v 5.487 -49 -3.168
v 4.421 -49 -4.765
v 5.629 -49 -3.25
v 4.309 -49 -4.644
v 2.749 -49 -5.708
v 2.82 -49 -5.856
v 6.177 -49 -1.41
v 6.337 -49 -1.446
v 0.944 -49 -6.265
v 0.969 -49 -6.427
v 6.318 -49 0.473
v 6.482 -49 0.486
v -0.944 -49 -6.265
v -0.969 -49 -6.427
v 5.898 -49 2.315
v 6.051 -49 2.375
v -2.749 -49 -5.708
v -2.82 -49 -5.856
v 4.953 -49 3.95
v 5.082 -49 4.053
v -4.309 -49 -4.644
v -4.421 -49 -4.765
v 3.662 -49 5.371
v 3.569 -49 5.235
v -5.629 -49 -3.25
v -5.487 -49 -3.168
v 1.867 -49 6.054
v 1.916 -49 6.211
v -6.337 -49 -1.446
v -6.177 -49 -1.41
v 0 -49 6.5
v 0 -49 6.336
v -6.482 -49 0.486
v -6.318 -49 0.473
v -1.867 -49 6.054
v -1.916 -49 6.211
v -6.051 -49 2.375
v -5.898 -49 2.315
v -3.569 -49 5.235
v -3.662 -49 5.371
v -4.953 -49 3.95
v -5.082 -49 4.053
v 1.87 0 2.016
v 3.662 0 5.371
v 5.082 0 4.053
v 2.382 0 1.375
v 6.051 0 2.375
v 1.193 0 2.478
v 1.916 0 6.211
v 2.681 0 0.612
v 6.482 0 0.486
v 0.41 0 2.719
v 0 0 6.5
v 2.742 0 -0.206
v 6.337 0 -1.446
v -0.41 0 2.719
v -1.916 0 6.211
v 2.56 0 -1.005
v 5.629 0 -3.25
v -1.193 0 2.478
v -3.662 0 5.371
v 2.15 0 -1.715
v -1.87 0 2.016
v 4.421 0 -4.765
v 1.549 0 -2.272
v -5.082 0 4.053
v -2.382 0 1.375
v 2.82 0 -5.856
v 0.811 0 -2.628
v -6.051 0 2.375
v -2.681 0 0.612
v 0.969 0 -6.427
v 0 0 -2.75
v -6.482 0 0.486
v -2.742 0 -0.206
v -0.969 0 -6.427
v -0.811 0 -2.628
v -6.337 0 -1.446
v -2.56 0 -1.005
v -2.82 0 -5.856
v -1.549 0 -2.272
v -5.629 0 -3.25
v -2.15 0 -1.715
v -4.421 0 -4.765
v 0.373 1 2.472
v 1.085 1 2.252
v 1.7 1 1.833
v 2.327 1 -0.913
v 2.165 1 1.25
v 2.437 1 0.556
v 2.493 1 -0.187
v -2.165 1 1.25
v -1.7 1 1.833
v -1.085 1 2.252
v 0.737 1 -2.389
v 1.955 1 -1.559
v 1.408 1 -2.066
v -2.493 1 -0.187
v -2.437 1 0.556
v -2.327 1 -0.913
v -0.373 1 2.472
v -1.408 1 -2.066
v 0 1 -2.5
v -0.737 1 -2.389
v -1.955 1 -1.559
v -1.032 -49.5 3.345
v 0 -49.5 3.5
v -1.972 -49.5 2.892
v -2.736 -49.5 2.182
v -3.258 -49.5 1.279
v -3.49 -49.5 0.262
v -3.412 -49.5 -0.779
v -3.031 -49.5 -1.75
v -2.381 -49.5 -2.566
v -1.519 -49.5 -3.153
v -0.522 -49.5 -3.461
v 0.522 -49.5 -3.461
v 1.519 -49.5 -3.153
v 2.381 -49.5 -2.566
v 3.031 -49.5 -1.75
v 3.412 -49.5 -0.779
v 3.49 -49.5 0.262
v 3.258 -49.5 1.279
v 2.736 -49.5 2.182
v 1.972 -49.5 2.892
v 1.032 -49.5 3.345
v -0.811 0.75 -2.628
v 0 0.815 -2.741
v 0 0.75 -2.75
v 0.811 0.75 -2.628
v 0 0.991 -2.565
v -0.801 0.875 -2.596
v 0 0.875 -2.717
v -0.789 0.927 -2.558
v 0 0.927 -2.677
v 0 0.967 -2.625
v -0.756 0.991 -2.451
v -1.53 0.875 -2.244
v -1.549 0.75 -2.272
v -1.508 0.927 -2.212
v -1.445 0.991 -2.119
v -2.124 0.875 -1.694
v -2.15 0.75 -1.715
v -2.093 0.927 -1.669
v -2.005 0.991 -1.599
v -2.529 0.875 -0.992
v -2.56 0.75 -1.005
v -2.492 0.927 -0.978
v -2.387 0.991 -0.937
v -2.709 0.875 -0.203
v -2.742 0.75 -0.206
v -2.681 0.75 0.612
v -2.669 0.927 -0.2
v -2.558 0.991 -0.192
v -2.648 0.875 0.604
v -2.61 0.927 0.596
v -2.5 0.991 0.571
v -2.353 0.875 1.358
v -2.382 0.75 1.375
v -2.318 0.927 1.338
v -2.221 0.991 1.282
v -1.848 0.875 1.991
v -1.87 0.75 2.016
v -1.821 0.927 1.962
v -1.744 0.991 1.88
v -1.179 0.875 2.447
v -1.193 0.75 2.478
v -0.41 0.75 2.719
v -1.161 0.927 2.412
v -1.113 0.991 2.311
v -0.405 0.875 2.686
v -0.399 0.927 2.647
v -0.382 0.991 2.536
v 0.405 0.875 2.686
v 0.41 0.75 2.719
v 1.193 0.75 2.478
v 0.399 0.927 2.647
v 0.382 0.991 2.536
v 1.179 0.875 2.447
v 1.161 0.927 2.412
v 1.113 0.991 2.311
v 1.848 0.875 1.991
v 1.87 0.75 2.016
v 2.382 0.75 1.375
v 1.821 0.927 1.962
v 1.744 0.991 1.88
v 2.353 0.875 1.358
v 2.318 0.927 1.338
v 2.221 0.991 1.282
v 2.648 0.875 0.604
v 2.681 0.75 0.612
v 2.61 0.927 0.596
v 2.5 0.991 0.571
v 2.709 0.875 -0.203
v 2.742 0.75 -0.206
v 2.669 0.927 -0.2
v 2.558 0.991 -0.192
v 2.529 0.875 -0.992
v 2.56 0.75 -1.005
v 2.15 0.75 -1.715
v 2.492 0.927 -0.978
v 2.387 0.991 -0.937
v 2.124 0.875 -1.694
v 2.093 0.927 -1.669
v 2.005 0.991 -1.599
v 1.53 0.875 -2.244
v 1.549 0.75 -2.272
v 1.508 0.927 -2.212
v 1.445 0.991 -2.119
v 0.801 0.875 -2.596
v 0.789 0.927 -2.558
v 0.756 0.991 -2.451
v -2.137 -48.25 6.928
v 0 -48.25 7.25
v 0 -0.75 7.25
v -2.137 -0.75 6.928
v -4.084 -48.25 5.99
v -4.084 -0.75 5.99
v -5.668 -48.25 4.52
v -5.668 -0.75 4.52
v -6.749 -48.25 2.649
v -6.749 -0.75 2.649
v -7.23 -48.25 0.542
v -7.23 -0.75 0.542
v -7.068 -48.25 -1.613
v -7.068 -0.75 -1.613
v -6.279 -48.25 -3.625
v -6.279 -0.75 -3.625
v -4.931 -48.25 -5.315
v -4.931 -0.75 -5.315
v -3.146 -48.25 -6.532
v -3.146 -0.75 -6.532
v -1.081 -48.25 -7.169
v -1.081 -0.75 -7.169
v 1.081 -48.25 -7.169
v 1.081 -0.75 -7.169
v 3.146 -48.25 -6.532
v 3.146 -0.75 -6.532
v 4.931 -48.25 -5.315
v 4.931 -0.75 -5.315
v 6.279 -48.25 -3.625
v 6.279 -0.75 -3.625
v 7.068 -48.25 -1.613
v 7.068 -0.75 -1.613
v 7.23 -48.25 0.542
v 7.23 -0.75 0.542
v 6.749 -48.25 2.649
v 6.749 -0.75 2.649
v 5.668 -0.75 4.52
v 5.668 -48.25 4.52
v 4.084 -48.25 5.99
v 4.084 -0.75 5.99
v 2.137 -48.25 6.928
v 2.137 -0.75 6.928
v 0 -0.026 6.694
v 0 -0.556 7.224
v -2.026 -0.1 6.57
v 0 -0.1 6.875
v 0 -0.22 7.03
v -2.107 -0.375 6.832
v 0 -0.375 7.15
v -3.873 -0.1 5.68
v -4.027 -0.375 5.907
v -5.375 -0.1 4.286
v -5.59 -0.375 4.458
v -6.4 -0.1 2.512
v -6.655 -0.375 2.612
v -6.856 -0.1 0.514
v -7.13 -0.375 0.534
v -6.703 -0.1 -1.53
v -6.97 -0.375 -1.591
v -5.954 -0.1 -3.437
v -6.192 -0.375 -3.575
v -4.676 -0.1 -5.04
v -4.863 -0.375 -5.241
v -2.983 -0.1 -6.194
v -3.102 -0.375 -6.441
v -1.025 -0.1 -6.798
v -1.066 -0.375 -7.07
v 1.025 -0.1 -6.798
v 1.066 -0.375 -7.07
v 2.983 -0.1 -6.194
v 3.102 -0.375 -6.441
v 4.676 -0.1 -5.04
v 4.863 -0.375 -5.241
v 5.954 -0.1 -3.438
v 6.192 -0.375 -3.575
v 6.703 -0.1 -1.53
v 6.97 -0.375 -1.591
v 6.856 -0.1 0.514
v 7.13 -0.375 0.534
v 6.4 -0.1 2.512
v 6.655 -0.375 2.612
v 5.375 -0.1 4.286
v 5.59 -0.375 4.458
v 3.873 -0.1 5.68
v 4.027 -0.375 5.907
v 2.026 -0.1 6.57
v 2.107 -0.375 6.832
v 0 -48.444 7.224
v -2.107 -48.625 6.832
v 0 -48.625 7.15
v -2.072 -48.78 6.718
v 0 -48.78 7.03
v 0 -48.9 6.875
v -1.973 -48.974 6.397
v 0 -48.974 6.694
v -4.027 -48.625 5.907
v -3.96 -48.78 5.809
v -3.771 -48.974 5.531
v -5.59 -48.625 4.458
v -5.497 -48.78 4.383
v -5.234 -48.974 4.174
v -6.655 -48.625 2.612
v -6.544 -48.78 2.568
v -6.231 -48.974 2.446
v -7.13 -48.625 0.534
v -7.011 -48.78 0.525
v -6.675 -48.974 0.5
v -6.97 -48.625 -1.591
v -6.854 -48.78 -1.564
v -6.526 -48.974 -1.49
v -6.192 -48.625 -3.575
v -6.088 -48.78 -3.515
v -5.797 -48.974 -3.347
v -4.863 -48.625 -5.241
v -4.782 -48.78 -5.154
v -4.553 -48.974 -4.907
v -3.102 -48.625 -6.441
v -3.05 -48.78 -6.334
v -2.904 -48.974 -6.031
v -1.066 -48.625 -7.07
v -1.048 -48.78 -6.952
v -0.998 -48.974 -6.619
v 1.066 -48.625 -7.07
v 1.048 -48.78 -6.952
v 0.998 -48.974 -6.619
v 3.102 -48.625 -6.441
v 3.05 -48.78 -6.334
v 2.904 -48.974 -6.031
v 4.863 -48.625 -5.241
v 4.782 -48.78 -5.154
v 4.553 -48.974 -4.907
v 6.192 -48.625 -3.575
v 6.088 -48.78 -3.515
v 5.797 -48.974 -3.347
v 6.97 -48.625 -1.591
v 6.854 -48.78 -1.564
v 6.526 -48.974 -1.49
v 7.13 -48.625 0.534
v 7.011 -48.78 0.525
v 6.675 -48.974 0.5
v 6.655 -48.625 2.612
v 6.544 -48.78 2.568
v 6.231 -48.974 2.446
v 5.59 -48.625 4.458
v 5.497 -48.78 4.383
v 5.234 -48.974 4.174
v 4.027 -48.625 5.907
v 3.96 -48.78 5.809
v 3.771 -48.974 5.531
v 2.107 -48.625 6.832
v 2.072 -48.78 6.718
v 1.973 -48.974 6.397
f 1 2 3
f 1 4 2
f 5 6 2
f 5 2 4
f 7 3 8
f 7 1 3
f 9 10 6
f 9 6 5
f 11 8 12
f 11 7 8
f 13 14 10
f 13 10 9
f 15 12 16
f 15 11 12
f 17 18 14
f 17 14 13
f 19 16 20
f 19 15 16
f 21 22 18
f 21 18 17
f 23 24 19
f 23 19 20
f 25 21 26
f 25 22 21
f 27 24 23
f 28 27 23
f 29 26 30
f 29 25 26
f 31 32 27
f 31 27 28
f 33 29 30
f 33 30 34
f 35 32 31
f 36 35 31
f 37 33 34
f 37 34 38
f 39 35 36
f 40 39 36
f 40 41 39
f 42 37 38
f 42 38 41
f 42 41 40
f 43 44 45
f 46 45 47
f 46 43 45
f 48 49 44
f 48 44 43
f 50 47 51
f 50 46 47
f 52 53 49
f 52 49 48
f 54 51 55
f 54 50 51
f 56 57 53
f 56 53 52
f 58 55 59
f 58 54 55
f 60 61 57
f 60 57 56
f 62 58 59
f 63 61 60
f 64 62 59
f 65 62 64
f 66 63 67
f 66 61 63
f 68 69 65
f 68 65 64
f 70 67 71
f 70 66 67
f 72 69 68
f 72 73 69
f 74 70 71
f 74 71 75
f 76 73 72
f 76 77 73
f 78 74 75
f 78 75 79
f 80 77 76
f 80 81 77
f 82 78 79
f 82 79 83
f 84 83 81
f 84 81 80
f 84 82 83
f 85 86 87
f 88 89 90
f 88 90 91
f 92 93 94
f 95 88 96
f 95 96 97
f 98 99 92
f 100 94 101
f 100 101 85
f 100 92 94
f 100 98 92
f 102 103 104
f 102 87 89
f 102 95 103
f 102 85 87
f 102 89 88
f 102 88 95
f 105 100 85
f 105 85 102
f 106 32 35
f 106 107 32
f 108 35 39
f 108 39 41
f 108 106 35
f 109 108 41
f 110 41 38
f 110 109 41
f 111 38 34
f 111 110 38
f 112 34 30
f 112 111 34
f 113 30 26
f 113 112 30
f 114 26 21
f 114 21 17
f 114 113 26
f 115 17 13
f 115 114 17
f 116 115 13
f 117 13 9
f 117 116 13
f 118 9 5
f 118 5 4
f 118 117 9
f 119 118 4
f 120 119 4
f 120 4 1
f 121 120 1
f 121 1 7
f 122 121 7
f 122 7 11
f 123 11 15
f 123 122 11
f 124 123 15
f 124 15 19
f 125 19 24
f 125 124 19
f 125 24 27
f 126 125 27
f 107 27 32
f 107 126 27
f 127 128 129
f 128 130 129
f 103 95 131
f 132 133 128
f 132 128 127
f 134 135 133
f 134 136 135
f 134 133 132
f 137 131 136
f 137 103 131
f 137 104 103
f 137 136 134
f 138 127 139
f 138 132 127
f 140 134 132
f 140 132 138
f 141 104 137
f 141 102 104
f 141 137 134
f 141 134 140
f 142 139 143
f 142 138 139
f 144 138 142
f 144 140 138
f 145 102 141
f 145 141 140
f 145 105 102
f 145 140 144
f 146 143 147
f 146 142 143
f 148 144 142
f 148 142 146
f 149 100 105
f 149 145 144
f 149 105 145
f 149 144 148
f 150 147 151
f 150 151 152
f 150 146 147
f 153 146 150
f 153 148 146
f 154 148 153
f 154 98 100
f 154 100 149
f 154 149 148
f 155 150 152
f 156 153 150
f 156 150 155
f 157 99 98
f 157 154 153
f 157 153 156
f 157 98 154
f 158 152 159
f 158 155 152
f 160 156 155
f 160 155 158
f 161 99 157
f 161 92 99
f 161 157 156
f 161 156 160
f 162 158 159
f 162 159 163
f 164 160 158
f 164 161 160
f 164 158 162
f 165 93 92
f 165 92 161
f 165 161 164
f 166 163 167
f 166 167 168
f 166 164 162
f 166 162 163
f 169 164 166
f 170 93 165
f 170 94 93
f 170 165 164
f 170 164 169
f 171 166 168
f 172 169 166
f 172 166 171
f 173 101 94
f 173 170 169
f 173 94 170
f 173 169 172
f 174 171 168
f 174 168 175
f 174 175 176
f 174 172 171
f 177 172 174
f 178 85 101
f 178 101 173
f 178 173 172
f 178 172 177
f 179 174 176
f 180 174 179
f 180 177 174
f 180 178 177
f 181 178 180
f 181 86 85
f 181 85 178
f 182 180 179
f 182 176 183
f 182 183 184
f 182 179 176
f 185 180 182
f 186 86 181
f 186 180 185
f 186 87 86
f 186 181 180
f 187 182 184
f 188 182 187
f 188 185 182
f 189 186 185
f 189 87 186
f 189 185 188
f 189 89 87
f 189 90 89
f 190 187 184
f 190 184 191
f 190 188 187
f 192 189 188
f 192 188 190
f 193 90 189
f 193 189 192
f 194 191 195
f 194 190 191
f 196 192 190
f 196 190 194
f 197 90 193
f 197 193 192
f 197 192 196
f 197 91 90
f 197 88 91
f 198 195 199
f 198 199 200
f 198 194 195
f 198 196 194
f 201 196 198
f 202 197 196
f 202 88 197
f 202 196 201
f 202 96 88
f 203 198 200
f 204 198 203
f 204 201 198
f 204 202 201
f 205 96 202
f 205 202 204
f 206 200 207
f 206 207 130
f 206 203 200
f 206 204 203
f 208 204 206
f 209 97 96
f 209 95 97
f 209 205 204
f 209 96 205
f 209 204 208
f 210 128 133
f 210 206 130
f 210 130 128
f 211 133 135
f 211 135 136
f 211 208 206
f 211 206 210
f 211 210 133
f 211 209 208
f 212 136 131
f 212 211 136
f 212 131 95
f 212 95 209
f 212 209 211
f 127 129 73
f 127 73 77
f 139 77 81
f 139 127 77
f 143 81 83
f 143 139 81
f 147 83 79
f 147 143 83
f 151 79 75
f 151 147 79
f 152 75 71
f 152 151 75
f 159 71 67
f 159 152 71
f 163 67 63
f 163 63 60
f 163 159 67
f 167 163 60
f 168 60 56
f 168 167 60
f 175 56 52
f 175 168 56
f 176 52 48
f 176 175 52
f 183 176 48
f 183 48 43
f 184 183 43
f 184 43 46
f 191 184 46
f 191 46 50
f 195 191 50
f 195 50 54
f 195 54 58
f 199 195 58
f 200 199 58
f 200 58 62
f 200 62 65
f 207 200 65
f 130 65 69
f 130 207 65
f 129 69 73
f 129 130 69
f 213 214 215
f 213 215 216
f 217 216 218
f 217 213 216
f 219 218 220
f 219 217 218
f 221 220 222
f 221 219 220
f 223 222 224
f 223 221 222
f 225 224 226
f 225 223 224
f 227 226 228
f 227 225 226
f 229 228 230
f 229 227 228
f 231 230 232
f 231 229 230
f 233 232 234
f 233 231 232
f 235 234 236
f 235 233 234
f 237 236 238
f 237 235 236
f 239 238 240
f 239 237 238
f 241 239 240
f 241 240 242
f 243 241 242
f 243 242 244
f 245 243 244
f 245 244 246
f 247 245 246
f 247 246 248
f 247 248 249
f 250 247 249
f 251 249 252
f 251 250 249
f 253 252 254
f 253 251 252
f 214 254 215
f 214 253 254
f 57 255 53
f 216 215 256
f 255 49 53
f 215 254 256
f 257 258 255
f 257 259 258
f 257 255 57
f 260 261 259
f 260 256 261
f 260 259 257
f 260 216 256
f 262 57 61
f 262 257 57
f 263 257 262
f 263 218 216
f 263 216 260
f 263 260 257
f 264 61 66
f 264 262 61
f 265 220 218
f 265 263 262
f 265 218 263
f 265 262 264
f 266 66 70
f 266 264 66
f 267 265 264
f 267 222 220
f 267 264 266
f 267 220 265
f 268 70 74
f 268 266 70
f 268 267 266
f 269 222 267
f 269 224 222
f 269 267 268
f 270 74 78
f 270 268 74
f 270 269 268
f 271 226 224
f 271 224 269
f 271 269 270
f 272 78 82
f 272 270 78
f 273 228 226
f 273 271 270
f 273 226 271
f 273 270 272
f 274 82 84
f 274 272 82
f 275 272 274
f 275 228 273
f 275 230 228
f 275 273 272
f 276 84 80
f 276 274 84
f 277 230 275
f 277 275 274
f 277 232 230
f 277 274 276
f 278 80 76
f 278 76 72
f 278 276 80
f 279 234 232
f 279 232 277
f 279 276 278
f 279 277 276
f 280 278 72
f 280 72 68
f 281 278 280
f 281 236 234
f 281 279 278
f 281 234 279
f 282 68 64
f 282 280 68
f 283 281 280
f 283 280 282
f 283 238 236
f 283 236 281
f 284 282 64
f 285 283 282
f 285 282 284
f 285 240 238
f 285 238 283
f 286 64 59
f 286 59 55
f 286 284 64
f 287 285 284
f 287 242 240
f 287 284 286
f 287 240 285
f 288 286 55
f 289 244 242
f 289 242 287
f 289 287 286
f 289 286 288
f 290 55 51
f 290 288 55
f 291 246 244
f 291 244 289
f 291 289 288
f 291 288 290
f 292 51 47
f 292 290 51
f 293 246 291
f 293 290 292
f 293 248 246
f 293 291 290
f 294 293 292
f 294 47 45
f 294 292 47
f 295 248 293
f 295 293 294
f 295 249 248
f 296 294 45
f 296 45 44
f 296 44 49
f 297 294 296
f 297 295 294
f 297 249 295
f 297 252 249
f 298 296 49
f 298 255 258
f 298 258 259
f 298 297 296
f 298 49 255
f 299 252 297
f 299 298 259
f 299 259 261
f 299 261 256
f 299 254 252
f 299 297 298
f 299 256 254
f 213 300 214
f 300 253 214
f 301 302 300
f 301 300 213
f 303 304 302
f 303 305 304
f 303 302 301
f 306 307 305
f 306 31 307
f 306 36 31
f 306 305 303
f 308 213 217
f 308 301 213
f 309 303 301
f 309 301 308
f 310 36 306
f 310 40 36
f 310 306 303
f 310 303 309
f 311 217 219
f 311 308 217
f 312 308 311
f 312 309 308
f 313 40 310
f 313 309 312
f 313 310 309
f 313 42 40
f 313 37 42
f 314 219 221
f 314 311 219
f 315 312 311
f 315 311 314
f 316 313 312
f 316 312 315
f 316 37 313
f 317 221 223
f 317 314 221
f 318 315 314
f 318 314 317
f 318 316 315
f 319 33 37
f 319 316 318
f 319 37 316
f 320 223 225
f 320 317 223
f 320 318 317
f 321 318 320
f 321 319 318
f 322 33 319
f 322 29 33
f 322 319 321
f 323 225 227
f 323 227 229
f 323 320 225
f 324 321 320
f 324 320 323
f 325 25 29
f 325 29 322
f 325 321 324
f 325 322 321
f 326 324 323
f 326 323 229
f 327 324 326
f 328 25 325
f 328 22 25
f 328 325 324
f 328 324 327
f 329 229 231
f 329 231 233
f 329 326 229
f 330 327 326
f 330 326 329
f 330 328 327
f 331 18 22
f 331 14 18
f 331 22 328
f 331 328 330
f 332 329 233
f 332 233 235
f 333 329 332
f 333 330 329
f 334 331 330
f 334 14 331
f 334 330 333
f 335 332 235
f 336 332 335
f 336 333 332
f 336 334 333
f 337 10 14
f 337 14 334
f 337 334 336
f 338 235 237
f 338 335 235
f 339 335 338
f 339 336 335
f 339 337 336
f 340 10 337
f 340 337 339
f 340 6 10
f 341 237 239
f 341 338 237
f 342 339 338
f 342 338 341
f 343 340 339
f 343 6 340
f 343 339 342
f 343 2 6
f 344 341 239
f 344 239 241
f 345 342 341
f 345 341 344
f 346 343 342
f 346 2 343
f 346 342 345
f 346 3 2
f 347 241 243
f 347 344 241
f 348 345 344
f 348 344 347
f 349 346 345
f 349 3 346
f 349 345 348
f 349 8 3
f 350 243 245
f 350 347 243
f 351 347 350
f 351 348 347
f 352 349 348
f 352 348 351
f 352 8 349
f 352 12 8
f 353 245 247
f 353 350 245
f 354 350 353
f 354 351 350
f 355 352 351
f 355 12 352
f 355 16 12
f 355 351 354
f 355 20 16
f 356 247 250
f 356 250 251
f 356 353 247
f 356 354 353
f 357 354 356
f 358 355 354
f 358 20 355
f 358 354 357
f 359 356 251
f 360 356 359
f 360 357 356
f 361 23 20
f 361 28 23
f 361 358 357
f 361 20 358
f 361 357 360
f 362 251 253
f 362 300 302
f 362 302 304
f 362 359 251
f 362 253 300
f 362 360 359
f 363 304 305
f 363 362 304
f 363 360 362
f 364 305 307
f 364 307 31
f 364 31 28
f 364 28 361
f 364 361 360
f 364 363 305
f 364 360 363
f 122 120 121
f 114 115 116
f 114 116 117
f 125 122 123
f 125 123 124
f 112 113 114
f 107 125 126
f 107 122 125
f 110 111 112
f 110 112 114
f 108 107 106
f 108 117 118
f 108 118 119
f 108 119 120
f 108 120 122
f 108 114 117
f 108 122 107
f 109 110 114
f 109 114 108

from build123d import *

# Parameters (mm, degrees)
SKETCH2_W = 2.75
SKETCH2_H = 1
FILLET1_R = 0.75
FILLET2_R = 0.25


with BuildPart() as part:
    # Sketch1 → Revolve1 (revolve)
    with BuildSketch(Plane.XY, mode=Mode.PRIVATE) as revolve1_sk:
        Polygon((0, 0), (-7.25, 0), (-7.25, -49), (-6.33564091, -49), (-3.5, -49.5), (0, -49.5), align=None)
    revolve(revolve1_sk.sketch.rotate(Axis((0, 0, 0), (0, -1, 0)), 270), axis=Axis((0, 0, 0), (0, -1, 0)))

    # Sketch2 → Revolve2 (revolve)
    with BuildSketch(Plane.XY, mode=Mode.PRIVATE) as revolve2_sk:
        with Locations((-1.375, 0.5)):
            Rectangle(SKETCH2_W, SKETCH2_H)
    revolve(revolve2_sk.sketch.rotate(Axis((0, 0, 0), (0, 1, 0)), 270), axis=Axis((0, 0, 0), (0, 1, 0)))

    # Fillet1
    fillet1_edges = [part.edges().sort_by_distance(p)[0] for p in [
        (0, -49, -7.25),
        (0, 0, -7.25),
    ]]
    fillet(fillet1_edges, radius=FILLET1_R)

    # Fillet2
    fillet2_edges = [part.edges().sort_by_distance(p)[0] for p in [
        (0, 1, 2.75),
    ]]
    fillet(fillet2_edges, radius=FILLET2_R)


solid = part.part
